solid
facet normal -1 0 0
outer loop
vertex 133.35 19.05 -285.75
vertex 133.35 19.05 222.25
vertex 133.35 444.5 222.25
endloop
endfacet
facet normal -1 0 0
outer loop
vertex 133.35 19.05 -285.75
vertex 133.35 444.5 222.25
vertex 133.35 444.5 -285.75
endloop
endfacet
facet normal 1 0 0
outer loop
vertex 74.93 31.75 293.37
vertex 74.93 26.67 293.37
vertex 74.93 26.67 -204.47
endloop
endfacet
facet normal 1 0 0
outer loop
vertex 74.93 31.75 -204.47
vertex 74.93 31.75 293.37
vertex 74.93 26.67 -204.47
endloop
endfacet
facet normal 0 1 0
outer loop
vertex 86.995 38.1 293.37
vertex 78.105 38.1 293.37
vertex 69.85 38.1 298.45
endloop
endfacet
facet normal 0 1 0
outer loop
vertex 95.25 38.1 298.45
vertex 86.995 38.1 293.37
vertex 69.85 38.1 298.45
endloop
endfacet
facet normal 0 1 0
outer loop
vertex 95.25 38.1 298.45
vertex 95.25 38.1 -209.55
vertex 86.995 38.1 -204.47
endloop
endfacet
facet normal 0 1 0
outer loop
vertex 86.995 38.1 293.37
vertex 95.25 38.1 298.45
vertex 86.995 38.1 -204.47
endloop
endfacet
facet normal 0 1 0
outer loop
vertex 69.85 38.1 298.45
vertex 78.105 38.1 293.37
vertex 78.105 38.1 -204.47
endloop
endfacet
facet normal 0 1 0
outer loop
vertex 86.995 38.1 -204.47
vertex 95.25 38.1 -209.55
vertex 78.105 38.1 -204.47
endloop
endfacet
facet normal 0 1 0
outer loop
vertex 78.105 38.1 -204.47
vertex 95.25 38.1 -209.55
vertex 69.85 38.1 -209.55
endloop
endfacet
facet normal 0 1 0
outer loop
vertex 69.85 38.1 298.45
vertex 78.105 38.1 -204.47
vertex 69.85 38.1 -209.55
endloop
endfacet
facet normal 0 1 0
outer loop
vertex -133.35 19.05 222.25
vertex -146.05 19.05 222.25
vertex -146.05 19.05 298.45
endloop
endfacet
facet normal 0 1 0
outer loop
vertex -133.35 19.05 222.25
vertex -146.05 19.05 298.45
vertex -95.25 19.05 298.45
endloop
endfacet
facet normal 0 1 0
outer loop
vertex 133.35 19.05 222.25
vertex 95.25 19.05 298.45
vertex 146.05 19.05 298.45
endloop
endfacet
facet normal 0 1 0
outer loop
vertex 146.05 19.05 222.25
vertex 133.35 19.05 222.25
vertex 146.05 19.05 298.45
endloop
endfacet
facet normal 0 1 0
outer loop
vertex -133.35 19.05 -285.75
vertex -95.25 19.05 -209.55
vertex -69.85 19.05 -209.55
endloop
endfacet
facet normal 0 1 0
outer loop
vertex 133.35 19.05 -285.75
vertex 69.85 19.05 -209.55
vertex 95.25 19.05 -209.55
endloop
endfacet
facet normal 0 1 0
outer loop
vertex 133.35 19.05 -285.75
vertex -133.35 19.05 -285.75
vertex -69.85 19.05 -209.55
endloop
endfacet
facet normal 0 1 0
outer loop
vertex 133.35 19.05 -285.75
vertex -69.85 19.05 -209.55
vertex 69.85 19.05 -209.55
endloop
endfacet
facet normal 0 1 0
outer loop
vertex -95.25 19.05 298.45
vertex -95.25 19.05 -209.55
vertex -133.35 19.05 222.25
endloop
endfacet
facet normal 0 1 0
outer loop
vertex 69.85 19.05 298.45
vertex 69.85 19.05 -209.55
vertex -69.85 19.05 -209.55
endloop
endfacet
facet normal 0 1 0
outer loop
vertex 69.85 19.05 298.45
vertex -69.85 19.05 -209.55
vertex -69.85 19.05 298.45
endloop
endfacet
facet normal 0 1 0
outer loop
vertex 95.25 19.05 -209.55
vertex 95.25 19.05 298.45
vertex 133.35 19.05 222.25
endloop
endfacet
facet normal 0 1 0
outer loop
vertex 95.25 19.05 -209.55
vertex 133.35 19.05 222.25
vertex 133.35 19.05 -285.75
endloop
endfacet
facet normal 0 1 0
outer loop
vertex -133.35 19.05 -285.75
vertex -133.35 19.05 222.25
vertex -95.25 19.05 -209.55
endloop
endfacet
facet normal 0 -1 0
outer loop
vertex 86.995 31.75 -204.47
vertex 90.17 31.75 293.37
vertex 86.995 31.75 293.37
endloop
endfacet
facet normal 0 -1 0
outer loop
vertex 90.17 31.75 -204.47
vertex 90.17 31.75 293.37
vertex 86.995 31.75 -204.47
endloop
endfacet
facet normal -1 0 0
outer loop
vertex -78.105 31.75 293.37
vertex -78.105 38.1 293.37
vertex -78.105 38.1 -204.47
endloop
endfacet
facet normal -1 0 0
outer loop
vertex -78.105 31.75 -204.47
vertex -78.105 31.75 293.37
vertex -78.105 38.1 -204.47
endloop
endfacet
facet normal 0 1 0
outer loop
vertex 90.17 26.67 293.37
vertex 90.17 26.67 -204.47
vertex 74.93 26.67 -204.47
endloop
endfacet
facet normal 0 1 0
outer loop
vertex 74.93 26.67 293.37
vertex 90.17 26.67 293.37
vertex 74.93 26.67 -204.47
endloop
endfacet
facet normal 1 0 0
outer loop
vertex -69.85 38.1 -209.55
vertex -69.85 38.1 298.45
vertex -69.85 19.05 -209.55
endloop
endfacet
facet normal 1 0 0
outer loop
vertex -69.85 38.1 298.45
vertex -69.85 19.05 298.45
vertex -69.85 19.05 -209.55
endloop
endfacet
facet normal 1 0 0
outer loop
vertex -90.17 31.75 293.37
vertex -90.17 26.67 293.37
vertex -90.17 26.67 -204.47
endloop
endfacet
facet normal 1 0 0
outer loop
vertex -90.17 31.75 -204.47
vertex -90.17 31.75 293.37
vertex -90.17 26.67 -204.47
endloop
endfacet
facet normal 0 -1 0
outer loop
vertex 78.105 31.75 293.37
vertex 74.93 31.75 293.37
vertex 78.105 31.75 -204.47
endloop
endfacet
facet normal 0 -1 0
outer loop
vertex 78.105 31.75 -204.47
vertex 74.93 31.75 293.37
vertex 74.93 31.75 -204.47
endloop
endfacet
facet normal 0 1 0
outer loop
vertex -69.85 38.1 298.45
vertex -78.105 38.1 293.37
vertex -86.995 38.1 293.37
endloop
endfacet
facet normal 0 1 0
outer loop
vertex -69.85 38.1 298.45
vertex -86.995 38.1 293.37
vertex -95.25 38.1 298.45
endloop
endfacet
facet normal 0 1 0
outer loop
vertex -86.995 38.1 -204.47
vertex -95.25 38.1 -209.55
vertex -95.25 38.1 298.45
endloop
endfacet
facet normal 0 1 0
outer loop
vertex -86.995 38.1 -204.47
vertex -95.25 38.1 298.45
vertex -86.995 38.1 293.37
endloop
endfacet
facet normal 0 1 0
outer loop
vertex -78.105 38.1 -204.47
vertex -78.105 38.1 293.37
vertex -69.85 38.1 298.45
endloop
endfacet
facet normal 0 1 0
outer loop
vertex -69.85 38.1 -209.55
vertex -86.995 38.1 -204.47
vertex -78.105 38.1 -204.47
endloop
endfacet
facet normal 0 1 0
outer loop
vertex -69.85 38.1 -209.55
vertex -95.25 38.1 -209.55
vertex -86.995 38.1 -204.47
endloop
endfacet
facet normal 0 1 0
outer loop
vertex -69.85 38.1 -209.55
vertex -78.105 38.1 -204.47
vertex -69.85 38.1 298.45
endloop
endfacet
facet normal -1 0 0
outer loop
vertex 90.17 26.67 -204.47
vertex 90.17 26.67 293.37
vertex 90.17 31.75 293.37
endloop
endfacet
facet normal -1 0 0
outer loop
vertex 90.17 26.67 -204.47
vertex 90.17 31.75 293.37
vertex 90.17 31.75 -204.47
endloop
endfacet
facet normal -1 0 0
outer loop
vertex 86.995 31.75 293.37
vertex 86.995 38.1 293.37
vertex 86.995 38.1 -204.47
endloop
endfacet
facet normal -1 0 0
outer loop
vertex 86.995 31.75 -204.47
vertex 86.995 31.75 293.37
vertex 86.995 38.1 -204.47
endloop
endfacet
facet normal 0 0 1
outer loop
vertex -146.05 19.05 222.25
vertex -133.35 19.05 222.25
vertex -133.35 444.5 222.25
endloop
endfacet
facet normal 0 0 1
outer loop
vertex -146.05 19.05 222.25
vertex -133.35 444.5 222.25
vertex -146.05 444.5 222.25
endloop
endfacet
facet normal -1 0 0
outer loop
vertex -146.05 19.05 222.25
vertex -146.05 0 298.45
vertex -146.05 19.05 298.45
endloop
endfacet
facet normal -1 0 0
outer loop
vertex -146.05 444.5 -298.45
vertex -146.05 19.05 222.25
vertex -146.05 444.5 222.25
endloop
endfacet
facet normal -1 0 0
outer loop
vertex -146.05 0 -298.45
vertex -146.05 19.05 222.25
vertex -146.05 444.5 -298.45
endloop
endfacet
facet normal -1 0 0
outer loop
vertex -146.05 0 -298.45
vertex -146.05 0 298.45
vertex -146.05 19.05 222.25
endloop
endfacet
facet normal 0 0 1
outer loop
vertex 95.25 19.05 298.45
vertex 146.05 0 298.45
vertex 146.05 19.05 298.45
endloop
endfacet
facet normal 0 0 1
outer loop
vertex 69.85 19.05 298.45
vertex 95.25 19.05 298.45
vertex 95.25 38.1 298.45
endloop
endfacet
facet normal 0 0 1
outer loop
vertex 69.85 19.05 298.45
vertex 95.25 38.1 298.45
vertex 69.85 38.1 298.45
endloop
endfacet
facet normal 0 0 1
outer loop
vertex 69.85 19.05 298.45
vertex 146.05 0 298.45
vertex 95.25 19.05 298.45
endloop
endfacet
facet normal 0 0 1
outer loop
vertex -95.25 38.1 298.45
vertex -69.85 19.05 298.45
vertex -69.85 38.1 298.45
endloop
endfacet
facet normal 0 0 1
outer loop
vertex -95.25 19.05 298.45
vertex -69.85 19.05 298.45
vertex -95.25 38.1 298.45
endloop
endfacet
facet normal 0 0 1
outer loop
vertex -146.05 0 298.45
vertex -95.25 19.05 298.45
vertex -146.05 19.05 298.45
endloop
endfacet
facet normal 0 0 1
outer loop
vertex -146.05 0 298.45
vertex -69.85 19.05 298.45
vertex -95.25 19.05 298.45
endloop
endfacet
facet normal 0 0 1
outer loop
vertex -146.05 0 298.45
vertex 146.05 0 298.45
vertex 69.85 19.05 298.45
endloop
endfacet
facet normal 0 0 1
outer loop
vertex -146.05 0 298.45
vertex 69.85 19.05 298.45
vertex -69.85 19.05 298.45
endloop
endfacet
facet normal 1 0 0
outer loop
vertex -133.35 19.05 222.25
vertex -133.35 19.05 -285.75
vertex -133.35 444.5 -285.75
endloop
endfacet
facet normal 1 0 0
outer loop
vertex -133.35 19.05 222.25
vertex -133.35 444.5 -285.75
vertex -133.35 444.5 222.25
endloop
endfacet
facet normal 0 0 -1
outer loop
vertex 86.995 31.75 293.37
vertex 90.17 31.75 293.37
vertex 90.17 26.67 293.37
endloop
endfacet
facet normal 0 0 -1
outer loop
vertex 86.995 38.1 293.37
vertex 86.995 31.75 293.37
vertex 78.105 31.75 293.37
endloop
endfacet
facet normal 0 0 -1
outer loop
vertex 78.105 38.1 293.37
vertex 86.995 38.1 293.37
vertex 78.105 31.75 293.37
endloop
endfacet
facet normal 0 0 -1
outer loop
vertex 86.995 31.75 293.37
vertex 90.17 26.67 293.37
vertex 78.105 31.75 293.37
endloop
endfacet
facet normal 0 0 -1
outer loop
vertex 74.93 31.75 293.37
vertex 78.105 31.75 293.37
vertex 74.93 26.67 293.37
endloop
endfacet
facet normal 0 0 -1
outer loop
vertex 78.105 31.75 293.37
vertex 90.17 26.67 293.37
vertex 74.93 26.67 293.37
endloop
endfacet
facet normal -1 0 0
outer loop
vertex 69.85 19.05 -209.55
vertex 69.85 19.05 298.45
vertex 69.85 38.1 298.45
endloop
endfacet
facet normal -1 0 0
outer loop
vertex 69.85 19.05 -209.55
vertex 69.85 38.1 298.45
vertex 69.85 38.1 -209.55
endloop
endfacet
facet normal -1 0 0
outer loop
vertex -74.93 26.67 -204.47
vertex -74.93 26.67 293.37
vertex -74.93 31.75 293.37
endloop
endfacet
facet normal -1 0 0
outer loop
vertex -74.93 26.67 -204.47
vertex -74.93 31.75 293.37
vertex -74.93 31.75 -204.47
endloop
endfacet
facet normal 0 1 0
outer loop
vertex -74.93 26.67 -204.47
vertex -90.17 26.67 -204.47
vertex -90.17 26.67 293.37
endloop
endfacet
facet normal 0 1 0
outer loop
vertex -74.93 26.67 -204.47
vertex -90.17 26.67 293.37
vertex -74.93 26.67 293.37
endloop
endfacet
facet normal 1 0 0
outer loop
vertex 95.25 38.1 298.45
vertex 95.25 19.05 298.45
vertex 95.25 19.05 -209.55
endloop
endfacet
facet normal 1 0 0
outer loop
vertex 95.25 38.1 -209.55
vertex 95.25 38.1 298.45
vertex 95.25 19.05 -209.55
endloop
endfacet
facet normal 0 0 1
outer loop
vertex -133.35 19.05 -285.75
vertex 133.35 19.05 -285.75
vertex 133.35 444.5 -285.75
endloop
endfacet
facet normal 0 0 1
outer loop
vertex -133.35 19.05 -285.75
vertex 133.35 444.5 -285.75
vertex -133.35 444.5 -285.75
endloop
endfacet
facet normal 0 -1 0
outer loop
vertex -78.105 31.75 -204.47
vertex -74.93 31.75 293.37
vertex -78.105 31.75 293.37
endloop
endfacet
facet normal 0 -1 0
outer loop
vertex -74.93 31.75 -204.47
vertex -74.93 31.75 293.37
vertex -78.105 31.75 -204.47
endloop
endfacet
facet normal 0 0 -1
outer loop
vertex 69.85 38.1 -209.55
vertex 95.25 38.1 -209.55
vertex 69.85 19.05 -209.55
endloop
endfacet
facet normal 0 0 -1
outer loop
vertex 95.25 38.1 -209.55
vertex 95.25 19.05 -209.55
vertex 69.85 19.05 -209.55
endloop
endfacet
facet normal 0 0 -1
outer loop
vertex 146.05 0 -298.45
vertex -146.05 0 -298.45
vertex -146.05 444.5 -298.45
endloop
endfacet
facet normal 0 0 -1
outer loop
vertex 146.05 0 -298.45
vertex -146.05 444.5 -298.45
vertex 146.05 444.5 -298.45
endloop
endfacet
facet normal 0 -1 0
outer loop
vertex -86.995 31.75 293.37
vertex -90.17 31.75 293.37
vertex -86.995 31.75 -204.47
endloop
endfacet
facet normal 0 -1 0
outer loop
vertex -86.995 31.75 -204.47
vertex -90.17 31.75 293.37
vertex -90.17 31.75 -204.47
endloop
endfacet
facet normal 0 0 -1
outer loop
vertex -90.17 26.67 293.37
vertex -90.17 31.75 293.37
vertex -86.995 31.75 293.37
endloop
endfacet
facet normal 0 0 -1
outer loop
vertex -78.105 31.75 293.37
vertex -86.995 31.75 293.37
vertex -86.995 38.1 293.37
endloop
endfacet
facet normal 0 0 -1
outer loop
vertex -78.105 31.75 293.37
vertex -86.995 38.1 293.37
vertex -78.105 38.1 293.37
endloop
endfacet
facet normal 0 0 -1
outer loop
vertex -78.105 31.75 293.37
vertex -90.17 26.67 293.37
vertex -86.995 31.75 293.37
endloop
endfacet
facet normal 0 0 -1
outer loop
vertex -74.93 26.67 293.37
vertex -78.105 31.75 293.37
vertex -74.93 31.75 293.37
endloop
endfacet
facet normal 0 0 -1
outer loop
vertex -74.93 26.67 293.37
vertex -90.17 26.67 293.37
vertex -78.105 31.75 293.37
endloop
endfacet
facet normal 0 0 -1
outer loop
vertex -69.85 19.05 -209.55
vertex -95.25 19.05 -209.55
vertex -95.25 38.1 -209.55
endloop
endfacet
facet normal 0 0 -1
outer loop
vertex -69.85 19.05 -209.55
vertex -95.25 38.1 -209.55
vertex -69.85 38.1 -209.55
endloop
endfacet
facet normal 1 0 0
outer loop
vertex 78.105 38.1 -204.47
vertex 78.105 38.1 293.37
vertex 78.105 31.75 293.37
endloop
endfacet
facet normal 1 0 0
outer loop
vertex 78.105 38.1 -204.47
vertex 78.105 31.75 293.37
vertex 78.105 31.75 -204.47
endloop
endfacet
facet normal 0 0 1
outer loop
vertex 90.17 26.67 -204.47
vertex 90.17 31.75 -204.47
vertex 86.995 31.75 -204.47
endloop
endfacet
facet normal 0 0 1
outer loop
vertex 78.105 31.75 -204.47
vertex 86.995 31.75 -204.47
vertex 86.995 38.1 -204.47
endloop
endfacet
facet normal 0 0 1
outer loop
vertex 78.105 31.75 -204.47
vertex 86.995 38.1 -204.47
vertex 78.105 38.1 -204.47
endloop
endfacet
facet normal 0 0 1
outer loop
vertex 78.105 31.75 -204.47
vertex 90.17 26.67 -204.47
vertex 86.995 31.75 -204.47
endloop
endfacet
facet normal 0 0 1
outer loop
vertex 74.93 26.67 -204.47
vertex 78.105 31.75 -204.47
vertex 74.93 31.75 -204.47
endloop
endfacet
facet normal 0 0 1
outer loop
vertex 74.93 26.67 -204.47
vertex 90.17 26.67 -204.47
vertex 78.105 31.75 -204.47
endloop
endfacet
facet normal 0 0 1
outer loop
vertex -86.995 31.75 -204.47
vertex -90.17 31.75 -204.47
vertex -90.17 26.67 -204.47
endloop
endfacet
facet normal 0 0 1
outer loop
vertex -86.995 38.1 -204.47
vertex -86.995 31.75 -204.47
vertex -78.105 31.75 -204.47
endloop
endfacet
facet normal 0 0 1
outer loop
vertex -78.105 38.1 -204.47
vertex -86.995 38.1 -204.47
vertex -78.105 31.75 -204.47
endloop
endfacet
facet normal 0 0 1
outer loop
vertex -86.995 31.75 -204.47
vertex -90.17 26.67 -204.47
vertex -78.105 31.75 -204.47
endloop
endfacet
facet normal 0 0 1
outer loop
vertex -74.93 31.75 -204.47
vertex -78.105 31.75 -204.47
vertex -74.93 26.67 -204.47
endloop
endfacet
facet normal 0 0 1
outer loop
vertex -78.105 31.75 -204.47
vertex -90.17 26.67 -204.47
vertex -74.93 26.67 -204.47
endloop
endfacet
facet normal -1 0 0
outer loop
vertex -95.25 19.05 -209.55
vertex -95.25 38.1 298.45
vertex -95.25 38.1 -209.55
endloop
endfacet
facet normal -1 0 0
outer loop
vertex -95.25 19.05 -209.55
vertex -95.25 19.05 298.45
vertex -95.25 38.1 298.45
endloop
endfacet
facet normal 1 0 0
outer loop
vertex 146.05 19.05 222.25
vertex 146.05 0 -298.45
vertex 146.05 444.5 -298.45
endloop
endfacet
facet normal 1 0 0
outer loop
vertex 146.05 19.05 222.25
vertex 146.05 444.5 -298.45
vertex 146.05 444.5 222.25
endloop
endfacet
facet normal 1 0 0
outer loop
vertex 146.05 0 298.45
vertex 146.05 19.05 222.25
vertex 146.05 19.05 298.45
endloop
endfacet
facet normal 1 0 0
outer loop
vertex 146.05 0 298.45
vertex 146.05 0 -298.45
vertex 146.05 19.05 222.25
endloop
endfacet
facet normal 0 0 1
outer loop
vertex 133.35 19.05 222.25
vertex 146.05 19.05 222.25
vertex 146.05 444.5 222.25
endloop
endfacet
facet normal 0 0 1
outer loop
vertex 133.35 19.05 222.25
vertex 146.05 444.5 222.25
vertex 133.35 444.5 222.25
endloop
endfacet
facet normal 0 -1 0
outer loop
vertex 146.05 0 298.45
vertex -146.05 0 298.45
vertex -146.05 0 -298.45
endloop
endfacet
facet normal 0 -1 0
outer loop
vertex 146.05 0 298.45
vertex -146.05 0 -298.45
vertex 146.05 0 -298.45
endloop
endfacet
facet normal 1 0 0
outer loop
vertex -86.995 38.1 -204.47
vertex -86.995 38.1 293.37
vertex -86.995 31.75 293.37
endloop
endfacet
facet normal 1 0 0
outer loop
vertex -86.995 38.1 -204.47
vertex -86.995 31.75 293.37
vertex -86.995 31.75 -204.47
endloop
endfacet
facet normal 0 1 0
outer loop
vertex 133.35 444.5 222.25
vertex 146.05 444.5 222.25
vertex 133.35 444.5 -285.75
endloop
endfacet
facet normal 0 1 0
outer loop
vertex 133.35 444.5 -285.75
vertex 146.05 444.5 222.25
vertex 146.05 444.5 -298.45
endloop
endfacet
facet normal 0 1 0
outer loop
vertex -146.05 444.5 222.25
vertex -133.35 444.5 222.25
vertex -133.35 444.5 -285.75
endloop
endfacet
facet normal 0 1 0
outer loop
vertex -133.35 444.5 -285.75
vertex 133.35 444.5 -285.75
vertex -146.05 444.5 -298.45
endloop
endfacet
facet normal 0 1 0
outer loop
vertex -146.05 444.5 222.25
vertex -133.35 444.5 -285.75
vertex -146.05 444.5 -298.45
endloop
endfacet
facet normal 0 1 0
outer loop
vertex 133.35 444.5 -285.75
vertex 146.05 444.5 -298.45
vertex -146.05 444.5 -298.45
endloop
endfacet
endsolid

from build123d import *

# Parameters (mm, degrees)
SKETCH1_W               = 292.1
SKETCH1_H               = 596.9
BOSS_EXTRUDE1_DEPTH     = 19.05
BOSS_EXTRUDE2_DEPTH     = 425.45
SKETCH3_W               = 25.4
SKETCH3_H               = 508
BOSS_EXTRUDE3_DEPTH     = 7.62
SKETCH4_W               = 25.4
SKETCH4_H               = 508
SKETCH4_W_2             = 15.24
SKETCH4_H_2             = 497.84
BOSS_EXTRUDE4_DEPTH     = 11.43
SKETCH5_W               = 497.84
SKETCH5_H               = 6.35
BOSS_EXTRUDE5_DEPTH     = 3.175
MIRROR2_COPY_1_SKETCH_W = 497.84
MIRROR2_COPY_1_SKETCH_H = 6.35
MIRROR2_COPY_1_DEPTH    = 3.175


with BuildPart() as part:
    # Sketch1 → Boss-Extrude1 (new body)
    with BuildSketch(Plane(origin=(0, 0, 0), x_dir=(1, 0, 0), z_dir=(0, 1, 0))):
        Rectangle(SKETCH1_W, SKETCH1_H)
    boss_extrude1 = extrude(amount=BOSS_EXTRUDE1_DEPTH)

    # Sketch2 → Boss-Extrude2 (add)
    with BuildSketch(Plane(origin=(0, 19.05, 0), x_dir=(1, 0, 0), z_dir=(0, 1, 0))):
        Polygon((-146.05, -222.25), (-146.05, 298.45), (146.05, 298.45), (146.05, -222.25), (133.35, -222.25), (133.35, 285.75), (-133.35, 285.75), (-133.35, -222.25), align=None)
    extrude(amount=BOSS_EXTRUDE2_DEPTH)

    # Sketch3 → Boss-Extrude3 (add)
    with BuildSketch(Plane(origin=(0, 19.05, 0), x_dir=(1, 0, 0), z_dir=(0, 1, 0))):
        with Locations((-82.55, -44.45)):
            Rectangle(SKETCH3_W, SKETCH3_H)
    boss_extrude3 = extrude(amount=BOSS_EXTRUDE3_DEPTH)

    # Sketch4 → Boss-Extrude4 (add)
    with BuildSketch(Plane(origin=(0, 26.67, 0), x_dir=(1, 0, 0), z_dir=(0, 1, 0))):
        with Locations((-82.55, -44.45)):
            Rectangle(SKETCH4_W, SKETCH4_H)
        with Locations((-82.55, -44.45)):
            Rectangle(SKETCH4_W_2, SKETCH4_H_2, mode=Mode.SUBTRACT)
    boss_extrude4 = extrude(amount=BOSS_EXTRUDE4_DEPTH)

    # Sketch5 → Boss-Extrude5 (add)
    with BuildSketch(Plane(origin=(-90.17, 0, 0), x_dir=(0, 0, -1), z_dir=(1, 0, 0))):
        with Locations((-44.45, 34.925)):
            Rectangle(SKETCH5_W, SKETCH5_H)
    boss_extrude5 = extrude(amount=BOSS_EXTRUDE5_DEPTH)

    # Mirror1: Boss-Extrude5 across plane
    add(boss_extrude5.mirror(Plane(origin=(-82.55, 0, 0), x_dir=(0, 0, 1), z_dir=(1, 0, 0))))

    # Mirror2: Boss-Extrude1, Boss-Extrude3, Boss-Extrude4, Boss-Extrude5 across plane
    add(boss_extrude1.mirror(Plane(origin=(0, 0, 0), x_dir=(0, 0, 1), z_dir=(1, 0, 0))))
    add(boss_extrude3.mirror(Plane(origin=(0, 0, 0), x_dir=(0, 0, 1), z_dir=(1, 0, 0))))
    add(boss_extrude4.mirror(Plane(origin=(0, 0, 0), x_dir=(0, 0, 1), z_dir=(1, 0, 0))))
    add(boss_extrude5.mirror(Plane(origin=(0, 0, 0), x_dir=(0, 0, 1), z_dir=(1, 0, 0))))

    # Mirror2 copy 1 sketch → Mirror2 copy 1 (add)
    with BuildSketch(Plane(origin=(74.93, 0, 0), x_dir=(0, 0, -1), z_dir=(1, 0, 0))):
        with Locations((-44.45, 34.925)):
            Rectangle(MIRROR2_COPY_1_SKETCH_W, MIRROR2_COPY_1_SKETCH_H)
    extrude(amount=MIRROR2_COPY_1_DEPTH)


solid = part.part
